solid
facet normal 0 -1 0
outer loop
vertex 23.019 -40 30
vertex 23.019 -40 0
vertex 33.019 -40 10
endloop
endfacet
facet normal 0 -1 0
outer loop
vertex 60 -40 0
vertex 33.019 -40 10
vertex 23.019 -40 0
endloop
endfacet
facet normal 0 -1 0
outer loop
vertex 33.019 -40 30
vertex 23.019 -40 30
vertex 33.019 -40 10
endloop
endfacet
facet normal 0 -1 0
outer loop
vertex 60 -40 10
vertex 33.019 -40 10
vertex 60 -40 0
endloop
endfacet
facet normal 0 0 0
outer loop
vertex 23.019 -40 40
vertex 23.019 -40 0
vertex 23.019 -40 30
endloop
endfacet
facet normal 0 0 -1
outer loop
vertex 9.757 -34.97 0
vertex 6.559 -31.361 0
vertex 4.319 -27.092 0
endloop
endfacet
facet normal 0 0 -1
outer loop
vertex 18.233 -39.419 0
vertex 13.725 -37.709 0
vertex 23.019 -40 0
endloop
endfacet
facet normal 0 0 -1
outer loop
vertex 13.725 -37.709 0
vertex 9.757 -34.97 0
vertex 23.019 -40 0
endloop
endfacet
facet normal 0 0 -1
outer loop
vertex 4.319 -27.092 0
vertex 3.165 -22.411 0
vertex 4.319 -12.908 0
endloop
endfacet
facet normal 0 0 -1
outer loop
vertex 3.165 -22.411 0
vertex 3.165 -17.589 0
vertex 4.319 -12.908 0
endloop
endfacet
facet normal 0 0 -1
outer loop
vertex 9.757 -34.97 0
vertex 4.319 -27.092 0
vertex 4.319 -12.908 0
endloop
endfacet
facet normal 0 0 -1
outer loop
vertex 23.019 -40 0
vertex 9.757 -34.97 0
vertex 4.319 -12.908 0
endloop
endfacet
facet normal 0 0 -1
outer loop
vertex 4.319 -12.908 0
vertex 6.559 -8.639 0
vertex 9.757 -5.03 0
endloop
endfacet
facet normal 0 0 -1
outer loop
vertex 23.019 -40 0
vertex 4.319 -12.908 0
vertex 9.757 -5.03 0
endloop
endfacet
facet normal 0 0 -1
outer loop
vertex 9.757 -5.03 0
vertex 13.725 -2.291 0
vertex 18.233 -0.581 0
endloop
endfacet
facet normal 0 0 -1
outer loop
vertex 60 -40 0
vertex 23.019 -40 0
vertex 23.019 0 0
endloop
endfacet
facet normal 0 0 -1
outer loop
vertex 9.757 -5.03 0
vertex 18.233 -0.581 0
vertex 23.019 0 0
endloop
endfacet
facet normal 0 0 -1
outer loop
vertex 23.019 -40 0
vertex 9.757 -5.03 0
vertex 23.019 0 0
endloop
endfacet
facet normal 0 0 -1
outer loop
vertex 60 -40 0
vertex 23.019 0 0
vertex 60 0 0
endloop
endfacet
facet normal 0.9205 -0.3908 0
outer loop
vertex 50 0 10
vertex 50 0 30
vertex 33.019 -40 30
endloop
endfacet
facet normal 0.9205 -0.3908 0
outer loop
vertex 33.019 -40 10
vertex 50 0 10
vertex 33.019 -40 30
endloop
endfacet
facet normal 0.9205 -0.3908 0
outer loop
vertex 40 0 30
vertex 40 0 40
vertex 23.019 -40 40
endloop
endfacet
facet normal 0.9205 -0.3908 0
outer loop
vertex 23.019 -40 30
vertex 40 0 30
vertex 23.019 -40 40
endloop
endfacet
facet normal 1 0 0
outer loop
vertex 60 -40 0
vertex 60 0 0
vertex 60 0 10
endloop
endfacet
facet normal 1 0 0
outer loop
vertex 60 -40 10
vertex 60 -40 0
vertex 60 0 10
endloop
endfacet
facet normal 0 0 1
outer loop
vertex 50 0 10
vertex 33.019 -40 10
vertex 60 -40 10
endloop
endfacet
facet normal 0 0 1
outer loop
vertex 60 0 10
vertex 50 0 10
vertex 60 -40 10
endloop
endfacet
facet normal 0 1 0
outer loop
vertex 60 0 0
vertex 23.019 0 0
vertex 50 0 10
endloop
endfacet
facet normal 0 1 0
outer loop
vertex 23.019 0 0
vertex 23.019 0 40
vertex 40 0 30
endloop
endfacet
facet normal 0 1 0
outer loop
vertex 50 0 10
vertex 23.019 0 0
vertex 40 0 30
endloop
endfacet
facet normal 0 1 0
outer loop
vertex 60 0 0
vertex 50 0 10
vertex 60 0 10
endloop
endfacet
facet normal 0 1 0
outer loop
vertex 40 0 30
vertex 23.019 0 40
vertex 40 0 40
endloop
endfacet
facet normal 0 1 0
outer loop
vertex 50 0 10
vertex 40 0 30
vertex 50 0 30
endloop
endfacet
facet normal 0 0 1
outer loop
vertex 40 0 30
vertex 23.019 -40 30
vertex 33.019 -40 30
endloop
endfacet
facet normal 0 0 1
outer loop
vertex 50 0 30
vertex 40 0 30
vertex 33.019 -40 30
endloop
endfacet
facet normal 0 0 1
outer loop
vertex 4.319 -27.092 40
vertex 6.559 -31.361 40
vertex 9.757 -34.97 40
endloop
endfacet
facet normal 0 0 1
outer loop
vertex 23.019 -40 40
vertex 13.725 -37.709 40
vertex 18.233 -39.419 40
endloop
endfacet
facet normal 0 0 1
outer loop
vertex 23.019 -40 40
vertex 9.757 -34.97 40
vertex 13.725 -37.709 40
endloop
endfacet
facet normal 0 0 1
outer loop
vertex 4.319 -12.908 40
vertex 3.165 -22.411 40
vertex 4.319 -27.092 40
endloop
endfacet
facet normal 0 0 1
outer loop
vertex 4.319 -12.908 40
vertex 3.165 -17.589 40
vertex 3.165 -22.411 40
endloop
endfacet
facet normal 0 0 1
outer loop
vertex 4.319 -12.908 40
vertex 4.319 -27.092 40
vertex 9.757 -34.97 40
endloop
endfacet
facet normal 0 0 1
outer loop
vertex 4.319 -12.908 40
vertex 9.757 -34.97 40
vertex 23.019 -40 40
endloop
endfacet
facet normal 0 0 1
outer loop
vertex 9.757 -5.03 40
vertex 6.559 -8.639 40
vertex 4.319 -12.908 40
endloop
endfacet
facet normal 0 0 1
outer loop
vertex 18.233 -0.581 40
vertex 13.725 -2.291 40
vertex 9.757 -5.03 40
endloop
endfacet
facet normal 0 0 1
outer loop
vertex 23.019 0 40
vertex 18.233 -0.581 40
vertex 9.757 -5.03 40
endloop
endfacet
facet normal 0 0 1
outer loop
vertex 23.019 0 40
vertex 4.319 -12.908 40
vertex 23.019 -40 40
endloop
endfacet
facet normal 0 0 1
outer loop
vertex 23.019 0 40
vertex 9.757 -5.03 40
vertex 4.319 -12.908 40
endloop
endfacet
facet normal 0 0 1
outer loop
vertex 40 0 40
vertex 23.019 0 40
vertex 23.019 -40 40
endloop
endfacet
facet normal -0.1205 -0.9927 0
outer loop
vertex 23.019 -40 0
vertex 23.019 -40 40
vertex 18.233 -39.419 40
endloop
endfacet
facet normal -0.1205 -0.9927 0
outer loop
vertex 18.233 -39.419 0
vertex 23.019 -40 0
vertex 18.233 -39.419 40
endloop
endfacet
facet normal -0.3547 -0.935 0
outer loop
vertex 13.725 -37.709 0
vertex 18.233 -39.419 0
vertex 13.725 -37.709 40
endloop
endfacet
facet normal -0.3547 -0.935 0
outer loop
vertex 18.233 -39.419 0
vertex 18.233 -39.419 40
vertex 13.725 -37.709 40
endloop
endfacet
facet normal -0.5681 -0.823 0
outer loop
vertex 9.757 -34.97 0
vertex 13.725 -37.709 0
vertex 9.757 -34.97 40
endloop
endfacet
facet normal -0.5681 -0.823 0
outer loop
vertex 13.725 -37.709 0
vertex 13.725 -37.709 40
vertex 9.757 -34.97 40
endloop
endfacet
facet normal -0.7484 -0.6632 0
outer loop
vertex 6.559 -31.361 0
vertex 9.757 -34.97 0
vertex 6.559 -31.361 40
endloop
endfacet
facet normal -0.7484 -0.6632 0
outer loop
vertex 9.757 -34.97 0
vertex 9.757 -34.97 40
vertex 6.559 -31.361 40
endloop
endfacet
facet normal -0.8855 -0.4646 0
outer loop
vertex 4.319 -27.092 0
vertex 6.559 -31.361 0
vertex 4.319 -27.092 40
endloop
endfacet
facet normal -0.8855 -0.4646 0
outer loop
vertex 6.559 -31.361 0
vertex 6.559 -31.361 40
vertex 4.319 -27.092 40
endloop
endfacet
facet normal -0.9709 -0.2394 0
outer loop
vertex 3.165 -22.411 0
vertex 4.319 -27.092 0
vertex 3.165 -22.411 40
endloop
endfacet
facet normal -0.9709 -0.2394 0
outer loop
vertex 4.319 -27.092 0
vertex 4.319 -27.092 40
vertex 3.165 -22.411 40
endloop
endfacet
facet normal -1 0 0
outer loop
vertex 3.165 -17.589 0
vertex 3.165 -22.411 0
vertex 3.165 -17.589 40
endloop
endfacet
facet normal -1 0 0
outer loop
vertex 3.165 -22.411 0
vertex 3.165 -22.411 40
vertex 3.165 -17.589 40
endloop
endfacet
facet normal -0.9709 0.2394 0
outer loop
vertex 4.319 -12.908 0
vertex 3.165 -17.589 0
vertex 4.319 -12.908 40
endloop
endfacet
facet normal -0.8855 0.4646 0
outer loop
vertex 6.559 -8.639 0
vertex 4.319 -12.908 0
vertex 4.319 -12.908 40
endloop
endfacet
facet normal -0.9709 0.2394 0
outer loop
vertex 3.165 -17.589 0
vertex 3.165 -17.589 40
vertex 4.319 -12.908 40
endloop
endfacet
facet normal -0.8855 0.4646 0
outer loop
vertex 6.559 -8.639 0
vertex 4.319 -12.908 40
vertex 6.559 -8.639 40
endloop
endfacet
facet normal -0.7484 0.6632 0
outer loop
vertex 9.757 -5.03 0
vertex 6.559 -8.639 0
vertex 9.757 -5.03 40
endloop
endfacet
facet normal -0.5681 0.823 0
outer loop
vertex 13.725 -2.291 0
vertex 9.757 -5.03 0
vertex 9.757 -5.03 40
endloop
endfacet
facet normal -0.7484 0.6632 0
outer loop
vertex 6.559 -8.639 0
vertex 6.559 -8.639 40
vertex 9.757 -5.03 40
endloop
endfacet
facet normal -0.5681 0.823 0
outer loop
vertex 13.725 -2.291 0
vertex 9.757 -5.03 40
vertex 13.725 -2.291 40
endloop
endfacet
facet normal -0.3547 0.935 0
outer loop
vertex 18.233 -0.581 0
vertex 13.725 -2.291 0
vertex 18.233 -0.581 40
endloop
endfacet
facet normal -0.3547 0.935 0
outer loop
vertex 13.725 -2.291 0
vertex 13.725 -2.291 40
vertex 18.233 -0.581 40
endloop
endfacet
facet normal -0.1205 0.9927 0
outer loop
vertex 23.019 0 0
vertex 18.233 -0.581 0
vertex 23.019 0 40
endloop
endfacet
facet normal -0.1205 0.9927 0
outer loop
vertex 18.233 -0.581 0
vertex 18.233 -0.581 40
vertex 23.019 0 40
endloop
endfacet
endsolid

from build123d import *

# Parameters (mm, degrees)
F0_W     = 60
F0_H     = 40
F1_DEPTH = 40
F3_DEPTH = 40
F5_DEPTH = 30
F7_DEPTH = 10


# Not quite as in the source:
# - ends of sketch curves that miss each other by under 0.0002 mm in the source are joined


with BuildPart() as f1:
    # F0 (on Front) → F1 (new body)
    with BuildSketch(Plane.XZ):
        with Locations((30, 20)):
            Rectangle(F0_W, F0_H)
    extrude(amount=F1_DEPTH)

    # F2 (on face) → F3 (cut)
    with BuildSketch(Plane.XY.offset(40)):
        with BuildLine():
            ThreePointArc((23.0189793024, -40), (3.0189805751, -19.9999993636), (23.0189805751, 0))
            Line((23.0189805751, 0), (0, 0))
            Line((0, 0), (0, -40))
            Line((0, -40), (23.0189793024, -40))
        make_face()
    extrude(amount=-F3_DEPTH, mode=Mode.SUBTRACT)

    # F4 (on face) → F5 (cut)
    with BuildSketch(Plane.XY.offset(40)):
        Polygon((50, 0), (33.0189805751, -40), (60, -40), (60, 0), align=None)
    extrude(amount=-F5_DEPTH, mode=Mode.SUBTRACT)

    # F6 (on face) → F7 (cut)
    with BuildSketch(Plane.XY.offset(40)):
        Polygon((40, 0), (23.0189805751, -40), (33.0189805751, -40), (50, 0), align=None)
    extrude(amount=-F7_DEPTH, mode=Mode.SUBTRACT)


solid = f1.part
